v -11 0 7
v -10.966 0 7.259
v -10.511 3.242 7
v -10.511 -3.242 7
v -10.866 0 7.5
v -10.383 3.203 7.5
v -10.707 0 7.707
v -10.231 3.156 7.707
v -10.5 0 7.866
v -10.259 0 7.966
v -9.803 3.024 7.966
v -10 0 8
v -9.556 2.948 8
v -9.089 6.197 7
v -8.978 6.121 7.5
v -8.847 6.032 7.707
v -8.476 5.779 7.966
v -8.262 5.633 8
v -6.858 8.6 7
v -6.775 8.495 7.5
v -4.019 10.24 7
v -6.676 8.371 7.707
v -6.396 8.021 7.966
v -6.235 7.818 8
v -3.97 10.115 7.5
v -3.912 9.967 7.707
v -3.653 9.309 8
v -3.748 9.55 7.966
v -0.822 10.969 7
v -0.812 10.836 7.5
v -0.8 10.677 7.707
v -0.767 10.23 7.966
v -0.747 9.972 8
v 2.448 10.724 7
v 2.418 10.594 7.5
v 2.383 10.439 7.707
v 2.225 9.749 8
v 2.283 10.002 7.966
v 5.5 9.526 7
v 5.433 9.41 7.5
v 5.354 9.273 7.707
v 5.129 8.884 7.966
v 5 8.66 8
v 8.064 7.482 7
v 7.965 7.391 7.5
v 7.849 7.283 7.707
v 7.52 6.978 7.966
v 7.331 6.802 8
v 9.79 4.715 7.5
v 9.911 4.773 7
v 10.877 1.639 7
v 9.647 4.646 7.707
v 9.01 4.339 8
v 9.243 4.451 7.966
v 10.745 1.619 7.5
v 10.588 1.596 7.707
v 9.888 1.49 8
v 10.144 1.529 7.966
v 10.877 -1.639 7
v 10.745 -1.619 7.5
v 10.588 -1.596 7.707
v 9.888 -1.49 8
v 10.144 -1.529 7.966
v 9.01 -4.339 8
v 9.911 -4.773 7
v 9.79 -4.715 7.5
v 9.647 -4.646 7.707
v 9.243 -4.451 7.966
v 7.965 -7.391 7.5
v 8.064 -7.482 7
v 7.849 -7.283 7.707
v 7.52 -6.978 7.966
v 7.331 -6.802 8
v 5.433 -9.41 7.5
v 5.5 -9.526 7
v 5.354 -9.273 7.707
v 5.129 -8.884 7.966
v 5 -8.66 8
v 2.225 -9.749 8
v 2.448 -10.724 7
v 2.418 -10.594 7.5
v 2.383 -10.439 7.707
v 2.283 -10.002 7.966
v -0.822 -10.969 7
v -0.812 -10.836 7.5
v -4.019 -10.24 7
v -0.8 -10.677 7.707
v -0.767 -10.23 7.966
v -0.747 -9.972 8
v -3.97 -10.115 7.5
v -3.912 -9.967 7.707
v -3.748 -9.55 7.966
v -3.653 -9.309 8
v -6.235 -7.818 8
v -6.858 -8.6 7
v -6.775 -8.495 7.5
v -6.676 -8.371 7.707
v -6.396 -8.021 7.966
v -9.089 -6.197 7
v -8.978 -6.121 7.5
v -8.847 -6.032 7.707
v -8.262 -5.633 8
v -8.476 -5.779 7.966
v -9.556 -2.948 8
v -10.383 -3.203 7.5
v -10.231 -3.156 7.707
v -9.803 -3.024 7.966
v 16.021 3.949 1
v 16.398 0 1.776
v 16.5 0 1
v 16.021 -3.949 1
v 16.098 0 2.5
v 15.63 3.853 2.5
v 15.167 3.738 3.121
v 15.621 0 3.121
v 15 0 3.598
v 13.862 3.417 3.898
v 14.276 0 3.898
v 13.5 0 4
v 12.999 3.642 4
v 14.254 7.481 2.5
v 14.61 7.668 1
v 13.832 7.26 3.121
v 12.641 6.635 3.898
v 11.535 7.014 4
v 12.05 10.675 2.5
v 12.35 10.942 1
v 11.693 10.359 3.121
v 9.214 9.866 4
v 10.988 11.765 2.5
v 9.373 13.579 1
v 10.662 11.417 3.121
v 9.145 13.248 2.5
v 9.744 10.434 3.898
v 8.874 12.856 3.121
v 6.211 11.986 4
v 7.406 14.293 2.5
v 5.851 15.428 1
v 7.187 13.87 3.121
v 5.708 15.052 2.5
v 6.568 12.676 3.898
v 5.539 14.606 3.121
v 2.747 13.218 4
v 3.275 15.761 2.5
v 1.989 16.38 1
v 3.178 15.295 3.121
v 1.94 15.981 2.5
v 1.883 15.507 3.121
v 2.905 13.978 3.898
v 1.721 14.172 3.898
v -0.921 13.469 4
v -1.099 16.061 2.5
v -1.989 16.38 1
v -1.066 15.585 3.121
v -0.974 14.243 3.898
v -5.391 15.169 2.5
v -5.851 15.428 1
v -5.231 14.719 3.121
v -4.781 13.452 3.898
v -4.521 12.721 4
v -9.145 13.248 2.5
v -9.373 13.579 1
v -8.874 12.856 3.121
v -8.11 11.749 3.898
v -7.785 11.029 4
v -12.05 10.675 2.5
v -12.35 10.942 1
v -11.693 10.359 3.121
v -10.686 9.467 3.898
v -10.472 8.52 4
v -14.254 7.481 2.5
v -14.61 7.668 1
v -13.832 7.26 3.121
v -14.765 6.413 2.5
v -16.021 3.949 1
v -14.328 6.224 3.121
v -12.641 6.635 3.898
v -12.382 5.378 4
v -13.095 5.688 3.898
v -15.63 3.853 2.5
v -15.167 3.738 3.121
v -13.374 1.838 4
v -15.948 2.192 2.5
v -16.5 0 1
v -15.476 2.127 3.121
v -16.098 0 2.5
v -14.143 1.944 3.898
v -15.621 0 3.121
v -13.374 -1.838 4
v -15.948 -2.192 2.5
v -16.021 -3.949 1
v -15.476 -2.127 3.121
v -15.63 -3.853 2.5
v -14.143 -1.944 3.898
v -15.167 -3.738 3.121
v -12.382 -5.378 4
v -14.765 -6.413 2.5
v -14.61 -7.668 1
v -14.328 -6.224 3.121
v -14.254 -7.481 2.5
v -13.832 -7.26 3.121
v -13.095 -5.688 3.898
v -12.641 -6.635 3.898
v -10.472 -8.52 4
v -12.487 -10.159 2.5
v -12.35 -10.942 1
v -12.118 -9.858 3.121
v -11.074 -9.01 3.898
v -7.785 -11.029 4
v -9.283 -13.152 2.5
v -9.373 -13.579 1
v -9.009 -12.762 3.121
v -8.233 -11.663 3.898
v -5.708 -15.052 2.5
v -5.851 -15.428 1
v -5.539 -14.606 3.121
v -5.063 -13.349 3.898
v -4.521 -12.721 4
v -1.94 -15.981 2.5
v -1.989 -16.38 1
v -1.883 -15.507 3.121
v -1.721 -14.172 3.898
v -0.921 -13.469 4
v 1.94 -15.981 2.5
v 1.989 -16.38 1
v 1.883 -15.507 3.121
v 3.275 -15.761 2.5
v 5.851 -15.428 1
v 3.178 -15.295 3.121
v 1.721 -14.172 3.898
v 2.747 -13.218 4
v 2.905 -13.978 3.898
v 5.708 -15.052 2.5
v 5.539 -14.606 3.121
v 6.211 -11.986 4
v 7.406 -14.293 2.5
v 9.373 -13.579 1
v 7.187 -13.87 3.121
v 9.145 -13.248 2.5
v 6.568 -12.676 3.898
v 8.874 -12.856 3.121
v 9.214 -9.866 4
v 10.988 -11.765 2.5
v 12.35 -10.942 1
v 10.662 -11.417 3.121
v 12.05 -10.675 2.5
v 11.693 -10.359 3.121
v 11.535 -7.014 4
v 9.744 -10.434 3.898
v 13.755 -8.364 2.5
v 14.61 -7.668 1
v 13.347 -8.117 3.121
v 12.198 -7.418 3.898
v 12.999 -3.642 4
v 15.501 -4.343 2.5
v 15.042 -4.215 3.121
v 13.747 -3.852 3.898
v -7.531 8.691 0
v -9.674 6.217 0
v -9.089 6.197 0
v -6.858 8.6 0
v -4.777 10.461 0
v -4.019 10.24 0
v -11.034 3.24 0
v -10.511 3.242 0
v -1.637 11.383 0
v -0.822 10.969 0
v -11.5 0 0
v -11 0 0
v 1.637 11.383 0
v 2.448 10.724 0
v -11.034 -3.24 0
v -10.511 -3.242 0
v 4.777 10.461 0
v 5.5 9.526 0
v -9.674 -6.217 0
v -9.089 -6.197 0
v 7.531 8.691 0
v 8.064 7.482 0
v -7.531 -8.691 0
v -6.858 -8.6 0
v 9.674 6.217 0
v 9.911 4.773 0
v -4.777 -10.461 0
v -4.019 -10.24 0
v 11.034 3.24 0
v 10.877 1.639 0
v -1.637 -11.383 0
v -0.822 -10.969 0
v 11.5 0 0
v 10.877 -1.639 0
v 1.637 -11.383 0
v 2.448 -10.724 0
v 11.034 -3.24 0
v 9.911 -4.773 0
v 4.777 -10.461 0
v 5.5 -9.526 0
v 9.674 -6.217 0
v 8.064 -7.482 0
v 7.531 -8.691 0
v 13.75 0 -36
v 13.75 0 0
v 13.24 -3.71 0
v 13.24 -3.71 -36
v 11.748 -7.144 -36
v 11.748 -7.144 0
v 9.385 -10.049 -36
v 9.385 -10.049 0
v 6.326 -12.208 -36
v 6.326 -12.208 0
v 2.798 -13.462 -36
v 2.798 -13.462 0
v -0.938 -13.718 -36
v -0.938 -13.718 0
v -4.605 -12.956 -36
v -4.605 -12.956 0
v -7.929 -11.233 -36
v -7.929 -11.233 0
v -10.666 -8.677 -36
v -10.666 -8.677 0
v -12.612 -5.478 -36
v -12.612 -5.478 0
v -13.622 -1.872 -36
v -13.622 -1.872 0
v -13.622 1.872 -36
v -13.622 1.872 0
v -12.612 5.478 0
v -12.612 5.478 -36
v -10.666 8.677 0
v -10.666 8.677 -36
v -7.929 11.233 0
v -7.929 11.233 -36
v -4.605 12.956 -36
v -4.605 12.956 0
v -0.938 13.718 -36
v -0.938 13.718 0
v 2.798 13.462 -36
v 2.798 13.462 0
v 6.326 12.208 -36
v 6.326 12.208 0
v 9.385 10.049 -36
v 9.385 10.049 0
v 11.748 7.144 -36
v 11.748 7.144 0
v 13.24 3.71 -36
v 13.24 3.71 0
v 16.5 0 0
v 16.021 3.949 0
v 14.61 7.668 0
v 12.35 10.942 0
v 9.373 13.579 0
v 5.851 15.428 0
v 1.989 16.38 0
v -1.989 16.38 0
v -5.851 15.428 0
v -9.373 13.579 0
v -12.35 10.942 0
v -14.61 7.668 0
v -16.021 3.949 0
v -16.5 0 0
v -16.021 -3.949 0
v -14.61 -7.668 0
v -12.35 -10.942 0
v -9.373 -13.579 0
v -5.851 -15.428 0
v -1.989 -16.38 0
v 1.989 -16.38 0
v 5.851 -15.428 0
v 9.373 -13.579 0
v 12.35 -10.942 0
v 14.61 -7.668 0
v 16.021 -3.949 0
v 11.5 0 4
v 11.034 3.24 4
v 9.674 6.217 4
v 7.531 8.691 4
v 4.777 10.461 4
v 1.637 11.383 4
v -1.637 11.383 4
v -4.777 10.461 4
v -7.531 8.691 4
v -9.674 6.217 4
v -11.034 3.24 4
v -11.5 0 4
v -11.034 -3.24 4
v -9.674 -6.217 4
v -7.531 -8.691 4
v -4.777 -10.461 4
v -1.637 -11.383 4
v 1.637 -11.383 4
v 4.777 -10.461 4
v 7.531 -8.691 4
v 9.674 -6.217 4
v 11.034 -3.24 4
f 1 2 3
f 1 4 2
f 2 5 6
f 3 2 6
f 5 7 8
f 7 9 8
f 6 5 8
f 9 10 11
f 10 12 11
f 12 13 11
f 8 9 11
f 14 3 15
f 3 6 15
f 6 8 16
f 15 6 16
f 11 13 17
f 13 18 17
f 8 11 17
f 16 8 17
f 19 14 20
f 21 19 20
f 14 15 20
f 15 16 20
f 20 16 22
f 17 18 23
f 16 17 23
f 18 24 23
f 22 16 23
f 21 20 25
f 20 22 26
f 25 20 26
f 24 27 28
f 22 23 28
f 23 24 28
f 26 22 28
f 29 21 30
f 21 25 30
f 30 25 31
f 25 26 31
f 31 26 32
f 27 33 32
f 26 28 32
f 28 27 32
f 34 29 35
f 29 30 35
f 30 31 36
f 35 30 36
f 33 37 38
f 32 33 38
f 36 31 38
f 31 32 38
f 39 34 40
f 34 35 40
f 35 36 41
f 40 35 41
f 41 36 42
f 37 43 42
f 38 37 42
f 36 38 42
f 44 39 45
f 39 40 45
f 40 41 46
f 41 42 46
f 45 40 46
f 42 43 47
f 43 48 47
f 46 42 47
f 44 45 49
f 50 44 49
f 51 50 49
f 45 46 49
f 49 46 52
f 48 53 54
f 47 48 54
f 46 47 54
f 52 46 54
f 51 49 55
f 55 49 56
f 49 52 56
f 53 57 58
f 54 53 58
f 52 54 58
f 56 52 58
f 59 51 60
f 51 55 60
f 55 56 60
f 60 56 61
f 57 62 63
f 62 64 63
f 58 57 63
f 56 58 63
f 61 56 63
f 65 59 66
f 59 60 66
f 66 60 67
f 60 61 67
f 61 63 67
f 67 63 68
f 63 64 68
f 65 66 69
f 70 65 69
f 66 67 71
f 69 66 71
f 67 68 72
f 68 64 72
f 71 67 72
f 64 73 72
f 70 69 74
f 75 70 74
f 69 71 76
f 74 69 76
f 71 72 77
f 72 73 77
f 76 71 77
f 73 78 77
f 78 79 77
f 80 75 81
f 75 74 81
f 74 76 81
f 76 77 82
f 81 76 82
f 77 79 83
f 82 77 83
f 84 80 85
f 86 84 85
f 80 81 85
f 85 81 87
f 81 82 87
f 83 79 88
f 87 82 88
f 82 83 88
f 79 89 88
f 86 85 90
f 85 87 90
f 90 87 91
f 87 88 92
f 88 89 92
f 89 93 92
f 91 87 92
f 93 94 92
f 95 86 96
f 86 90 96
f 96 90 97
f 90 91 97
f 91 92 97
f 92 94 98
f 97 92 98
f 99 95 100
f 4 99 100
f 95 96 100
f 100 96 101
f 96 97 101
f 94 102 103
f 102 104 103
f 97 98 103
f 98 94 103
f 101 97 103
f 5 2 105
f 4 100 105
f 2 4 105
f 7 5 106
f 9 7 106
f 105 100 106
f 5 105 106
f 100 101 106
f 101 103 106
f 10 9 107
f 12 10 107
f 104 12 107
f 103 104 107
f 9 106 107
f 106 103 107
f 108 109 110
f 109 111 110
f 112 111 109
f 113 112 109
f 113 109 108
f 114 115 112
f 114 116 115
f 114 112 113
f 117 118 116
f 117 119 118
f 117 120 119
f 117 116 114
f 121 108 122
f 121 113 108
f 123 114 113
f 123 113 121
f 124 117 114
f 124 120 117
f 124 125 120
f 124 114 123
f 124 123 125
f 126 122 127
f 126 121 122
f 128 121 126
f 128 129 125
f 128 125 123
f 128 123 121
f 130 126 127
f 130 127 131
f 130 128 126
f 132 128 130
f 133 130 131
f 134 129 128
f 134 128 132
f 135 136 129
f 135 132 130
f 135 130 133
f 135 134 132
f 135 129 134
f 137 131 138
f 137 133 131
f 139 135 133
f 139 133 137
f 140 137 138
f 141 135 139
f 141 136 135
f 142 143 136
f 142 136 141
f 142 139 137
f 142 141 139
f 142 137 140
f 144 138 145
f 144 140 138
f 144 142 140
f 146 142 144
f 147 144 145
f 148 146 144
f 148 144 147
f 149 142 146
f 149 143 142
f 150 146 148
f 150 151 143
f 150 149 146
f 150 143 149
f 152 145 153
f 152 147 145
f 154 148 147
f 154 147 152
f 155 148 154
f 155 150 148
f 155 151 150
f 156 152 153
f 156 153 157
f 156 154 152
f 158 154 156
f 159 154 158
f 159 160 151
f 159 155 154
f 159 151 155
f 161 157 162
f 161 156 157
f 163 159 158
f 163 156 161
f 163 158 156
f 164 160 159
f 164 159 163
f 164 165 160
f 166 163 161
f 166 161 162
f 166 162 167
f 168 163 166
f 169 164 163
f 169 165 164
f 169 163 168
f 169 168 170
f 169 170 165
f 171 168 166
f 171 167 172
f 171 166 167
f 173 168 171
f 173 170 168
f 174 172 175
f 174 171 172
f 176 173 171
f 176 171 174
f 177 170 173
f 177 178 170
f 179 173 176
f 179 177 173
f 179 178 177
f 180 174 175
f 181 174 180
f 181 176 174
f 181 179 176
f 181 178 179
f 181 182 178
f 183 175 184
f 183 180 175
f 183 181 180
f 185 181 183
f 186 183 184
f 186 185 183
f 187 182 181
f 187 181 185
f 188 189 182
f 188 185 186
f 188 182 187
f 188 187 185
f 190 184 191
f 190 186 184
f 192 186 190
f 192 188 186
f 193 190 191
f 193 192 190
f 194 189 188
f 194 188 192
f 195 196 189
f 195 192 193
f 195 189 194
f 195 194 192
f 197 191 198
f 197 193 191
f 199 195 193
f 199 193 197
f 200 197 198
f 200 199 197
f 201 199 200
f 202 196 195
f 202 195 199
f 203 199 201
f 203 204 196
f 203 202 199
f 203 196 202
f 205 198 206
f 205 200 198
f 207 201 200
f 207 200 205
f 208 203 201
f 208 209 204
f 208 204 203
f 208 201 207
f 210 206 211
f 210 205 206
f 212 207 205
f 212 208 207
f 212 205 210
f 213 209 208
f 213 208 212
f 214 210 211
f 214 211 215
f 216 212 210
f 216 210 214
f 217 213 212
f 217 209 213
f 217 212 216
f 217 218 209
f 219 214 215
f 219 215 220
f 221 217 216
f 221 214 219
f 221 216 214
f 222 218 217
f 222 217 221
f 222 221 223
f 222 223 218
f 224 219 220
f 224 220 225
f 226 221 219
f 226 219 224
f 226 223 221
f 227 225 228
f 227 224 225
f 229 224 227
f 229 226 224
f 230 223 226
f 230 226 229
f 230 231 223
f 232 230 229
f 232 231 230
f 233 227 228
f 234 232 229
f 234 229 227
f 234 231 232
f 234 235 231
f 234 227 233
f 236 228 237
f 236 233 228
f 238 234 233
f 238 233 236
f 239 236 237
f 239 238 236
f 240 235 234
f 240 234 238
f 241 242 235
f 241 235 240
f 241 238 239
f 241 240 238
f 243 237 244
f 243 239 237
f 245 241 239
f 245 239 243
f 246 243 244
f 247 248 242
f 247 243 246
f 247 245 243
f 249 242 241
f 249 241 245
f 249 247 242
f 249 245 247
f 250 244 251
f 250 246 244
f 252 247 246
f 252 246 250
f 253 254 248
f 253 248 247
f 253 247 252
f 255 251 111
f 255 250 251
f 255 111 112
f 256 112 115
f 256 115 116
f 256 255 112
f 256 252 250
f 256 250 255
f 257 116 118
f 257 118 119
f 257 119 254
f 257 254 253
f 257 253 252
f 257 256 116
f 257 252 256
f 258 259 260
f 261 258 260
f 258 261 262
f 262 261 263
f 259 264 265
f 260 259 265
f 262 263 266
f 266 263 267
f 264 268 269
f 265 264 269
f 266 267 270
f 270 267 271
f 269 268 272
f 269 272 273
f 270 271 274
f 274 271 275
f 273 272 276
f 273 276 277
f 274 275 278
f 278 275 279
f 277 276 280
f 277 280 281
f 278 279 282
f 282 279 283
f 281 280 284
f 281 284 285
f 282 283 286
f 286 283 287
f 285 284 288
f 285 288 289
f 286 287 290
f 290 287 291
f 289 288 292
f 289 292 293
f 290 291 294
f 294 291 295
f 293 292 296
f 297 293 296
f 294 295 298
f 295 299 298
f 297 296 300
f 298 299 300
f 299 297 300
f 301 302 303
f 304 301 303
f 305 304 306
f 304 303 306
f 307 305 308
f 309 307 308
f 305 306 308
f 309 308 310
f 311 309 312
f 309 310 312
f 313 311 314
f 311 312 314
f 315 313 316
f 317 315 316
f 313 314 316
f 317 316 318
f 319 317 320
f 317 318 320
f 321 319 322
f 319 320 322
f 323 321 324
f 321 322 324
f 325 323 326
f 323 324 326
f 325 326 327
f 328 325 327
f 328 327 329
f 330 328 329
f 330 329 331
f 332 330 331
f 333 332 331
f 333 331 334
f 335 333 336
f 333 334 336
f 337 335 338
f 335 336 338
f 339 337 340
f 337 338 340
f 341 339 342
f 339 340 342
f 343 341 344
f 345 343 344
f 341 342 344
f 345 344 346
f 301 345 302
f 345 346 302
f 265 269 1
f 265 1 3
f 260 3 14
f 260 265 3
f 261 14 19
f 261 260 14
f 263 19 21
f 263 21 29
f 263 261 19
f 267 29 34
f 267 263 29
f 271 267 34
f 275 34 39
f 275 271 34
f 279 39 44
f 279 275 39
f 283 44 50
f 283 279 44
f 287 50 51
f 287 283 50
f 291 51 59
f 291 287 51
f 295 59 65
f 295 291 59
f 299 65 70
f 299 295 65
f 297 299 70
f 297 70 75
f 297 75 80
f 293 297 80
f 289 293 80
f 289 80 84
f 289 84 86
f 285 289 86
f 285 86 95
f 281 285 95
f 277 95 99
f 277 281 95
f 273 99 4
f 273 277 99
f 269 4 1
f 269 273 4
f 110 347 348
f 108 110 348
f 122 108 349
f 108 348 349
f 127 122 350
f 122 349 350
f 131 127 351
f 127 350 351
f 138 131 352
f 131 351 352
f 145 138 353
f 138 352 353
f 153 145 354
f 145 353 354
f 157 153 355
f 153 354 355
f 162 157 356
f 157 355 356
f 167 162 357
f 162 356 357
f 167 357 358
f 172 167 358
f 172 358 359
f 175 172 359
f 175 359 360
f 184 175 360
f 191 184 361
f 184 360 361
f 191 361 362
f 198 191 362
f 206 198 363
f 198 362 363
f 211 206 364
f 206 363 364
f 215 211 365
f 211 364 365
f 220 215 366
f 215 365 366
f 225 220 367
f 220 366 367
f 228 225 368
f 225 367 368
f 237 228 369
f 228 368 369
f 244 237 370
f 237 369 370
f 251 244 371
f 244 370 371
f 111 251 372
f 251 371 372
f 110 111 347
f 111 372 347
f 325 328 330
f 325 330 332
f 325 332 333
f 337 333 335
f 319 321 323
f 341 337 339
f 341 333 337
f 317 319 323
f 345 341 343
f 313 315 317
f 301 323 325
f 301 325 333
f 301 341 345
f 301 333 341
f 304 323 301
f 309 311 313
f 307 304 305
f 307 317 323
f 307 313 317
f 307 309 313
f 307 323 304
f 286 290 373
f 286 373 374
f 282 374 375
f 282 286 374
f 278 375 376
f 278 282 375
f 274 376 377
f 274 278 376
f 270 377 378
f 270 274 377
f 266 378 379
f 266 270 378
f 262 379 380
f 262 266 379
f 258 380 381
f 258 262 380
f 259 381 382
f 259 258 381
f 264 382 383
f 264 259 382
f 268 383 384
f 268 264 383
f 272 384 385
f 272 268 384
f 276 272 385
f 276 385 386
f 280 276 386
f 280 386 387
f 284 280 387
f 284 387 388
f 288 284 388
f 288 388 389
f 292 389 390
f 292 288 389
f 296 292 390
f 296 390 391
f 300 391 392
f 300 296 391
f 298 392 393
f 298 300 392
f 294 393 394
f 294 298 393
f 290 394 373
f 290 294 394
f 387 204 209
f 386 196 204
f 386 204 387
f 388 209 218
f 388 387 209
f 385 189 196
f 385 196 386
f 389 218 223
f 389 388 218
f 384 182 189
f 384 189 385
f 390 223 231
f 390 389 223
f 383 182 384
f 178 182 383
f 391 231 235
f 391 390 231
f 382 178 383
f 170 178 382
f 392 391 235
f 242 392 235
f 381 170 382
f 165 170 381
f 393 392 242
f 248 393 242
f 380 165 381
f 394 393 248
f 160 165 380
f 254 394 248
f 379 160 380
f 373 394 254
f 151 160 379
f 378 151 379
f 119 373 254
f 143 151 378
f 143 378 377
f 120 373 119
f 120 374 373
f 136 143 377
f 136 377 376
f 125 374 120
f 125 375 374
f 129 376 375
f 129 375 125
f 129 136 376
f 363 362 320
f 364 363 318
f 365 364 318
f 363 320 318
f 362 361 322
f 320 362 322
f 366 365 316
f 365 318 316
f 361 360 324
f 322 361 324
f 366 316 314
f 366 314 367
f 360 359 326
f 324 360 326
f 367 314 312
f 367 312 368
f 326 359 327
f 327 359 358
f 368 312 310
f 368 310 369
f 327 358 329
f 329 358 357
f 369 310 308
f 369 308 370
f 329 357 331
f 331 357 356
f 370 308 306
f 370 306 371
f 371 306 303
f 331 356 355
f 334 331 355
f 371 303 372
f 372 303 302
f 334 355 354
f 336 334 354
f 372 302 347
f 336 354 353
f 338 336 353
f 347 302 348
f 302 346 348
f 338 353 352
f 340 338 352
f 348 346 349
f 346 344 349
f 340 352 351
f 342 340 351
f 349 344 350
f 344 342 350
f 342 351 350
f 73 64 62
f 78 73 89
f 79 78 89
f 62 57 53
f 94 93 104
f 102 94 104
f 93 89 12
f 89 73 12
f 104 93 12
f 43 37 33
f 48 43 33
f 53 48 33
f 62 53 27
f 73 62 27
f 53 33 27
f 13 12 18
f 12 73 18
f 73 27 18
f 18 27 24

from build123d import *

# Parameters (mm, degrees)
ESQUISSE1_R        = 16.5
ESQUISSE1_R_2      = 11.5
BOSS_EXTRU_1_DEPTH = 4
CONG_1_R           = 3
ESQUISSE2_R        = 11
BOSS_EXTRU_2_DEPTH = 8
CONG_2_R           = 1
ESQUISSE3_R        = 13.75
BOSS_EXTRU_3_DEPTH = 36


with BuildPart() as part:
    # Esquisse1 → Boss.-Extru.1 (new body)
    with BuildSketch(Plane.XY):
        Circle(ESQUISSE1_R)
        Circle(ESQUISSE1_R_2, mode=Mode.SUBTRACT)
    extrude(amount=BOSS_EXTRU_1_DEPTH)

    # Congé1
    cong_1_edges = [part.edges().sort_by_distance(p)[0] for p in [
        (-16.5, 0, 4),
    ]]
    fillet(cong_1_edges, radius=CONG_1_R)



with BuildPart() as body_2:
    # Esquisse2 → Boss.-Extru.2 (new body)
    with BuildSketch(Plane(origin=(0, 0, 0), x_dir=(-1, 0, 0), z_dir=(0, 0, -1))):
        Circle(ESQUISSE2_R)
    extrude(amount=-BOSS_EXTRU_2_DEPTH)

    # Congé2
    cong_2_edges = [body_2.edges().sort_by_distance(p)[0] for p in [
        (11, 0, 8),
    ]]
    fillet(cong_2_edges, radius=CONG_2_R)


with BuildPart() as part_1:
    add(part.part)

    add(body_2.part)  # Boss.-Extru.3 merges body 2
    # Esquisse3 → Boss.-Extru.3 (add)
    with BuildSketch(Plane(origin=(0, 0, 0), x_dir=(-1, 0, 0), z_dir=(0, 0, -1))):
        with Locations(Location((0, 0, 0), (0, 0, 180))):
            Circle(ESQUISSE3_R)
    extrude(amount=BOSS_EXTRU_3_DEPTH)


solid = part_1.part
